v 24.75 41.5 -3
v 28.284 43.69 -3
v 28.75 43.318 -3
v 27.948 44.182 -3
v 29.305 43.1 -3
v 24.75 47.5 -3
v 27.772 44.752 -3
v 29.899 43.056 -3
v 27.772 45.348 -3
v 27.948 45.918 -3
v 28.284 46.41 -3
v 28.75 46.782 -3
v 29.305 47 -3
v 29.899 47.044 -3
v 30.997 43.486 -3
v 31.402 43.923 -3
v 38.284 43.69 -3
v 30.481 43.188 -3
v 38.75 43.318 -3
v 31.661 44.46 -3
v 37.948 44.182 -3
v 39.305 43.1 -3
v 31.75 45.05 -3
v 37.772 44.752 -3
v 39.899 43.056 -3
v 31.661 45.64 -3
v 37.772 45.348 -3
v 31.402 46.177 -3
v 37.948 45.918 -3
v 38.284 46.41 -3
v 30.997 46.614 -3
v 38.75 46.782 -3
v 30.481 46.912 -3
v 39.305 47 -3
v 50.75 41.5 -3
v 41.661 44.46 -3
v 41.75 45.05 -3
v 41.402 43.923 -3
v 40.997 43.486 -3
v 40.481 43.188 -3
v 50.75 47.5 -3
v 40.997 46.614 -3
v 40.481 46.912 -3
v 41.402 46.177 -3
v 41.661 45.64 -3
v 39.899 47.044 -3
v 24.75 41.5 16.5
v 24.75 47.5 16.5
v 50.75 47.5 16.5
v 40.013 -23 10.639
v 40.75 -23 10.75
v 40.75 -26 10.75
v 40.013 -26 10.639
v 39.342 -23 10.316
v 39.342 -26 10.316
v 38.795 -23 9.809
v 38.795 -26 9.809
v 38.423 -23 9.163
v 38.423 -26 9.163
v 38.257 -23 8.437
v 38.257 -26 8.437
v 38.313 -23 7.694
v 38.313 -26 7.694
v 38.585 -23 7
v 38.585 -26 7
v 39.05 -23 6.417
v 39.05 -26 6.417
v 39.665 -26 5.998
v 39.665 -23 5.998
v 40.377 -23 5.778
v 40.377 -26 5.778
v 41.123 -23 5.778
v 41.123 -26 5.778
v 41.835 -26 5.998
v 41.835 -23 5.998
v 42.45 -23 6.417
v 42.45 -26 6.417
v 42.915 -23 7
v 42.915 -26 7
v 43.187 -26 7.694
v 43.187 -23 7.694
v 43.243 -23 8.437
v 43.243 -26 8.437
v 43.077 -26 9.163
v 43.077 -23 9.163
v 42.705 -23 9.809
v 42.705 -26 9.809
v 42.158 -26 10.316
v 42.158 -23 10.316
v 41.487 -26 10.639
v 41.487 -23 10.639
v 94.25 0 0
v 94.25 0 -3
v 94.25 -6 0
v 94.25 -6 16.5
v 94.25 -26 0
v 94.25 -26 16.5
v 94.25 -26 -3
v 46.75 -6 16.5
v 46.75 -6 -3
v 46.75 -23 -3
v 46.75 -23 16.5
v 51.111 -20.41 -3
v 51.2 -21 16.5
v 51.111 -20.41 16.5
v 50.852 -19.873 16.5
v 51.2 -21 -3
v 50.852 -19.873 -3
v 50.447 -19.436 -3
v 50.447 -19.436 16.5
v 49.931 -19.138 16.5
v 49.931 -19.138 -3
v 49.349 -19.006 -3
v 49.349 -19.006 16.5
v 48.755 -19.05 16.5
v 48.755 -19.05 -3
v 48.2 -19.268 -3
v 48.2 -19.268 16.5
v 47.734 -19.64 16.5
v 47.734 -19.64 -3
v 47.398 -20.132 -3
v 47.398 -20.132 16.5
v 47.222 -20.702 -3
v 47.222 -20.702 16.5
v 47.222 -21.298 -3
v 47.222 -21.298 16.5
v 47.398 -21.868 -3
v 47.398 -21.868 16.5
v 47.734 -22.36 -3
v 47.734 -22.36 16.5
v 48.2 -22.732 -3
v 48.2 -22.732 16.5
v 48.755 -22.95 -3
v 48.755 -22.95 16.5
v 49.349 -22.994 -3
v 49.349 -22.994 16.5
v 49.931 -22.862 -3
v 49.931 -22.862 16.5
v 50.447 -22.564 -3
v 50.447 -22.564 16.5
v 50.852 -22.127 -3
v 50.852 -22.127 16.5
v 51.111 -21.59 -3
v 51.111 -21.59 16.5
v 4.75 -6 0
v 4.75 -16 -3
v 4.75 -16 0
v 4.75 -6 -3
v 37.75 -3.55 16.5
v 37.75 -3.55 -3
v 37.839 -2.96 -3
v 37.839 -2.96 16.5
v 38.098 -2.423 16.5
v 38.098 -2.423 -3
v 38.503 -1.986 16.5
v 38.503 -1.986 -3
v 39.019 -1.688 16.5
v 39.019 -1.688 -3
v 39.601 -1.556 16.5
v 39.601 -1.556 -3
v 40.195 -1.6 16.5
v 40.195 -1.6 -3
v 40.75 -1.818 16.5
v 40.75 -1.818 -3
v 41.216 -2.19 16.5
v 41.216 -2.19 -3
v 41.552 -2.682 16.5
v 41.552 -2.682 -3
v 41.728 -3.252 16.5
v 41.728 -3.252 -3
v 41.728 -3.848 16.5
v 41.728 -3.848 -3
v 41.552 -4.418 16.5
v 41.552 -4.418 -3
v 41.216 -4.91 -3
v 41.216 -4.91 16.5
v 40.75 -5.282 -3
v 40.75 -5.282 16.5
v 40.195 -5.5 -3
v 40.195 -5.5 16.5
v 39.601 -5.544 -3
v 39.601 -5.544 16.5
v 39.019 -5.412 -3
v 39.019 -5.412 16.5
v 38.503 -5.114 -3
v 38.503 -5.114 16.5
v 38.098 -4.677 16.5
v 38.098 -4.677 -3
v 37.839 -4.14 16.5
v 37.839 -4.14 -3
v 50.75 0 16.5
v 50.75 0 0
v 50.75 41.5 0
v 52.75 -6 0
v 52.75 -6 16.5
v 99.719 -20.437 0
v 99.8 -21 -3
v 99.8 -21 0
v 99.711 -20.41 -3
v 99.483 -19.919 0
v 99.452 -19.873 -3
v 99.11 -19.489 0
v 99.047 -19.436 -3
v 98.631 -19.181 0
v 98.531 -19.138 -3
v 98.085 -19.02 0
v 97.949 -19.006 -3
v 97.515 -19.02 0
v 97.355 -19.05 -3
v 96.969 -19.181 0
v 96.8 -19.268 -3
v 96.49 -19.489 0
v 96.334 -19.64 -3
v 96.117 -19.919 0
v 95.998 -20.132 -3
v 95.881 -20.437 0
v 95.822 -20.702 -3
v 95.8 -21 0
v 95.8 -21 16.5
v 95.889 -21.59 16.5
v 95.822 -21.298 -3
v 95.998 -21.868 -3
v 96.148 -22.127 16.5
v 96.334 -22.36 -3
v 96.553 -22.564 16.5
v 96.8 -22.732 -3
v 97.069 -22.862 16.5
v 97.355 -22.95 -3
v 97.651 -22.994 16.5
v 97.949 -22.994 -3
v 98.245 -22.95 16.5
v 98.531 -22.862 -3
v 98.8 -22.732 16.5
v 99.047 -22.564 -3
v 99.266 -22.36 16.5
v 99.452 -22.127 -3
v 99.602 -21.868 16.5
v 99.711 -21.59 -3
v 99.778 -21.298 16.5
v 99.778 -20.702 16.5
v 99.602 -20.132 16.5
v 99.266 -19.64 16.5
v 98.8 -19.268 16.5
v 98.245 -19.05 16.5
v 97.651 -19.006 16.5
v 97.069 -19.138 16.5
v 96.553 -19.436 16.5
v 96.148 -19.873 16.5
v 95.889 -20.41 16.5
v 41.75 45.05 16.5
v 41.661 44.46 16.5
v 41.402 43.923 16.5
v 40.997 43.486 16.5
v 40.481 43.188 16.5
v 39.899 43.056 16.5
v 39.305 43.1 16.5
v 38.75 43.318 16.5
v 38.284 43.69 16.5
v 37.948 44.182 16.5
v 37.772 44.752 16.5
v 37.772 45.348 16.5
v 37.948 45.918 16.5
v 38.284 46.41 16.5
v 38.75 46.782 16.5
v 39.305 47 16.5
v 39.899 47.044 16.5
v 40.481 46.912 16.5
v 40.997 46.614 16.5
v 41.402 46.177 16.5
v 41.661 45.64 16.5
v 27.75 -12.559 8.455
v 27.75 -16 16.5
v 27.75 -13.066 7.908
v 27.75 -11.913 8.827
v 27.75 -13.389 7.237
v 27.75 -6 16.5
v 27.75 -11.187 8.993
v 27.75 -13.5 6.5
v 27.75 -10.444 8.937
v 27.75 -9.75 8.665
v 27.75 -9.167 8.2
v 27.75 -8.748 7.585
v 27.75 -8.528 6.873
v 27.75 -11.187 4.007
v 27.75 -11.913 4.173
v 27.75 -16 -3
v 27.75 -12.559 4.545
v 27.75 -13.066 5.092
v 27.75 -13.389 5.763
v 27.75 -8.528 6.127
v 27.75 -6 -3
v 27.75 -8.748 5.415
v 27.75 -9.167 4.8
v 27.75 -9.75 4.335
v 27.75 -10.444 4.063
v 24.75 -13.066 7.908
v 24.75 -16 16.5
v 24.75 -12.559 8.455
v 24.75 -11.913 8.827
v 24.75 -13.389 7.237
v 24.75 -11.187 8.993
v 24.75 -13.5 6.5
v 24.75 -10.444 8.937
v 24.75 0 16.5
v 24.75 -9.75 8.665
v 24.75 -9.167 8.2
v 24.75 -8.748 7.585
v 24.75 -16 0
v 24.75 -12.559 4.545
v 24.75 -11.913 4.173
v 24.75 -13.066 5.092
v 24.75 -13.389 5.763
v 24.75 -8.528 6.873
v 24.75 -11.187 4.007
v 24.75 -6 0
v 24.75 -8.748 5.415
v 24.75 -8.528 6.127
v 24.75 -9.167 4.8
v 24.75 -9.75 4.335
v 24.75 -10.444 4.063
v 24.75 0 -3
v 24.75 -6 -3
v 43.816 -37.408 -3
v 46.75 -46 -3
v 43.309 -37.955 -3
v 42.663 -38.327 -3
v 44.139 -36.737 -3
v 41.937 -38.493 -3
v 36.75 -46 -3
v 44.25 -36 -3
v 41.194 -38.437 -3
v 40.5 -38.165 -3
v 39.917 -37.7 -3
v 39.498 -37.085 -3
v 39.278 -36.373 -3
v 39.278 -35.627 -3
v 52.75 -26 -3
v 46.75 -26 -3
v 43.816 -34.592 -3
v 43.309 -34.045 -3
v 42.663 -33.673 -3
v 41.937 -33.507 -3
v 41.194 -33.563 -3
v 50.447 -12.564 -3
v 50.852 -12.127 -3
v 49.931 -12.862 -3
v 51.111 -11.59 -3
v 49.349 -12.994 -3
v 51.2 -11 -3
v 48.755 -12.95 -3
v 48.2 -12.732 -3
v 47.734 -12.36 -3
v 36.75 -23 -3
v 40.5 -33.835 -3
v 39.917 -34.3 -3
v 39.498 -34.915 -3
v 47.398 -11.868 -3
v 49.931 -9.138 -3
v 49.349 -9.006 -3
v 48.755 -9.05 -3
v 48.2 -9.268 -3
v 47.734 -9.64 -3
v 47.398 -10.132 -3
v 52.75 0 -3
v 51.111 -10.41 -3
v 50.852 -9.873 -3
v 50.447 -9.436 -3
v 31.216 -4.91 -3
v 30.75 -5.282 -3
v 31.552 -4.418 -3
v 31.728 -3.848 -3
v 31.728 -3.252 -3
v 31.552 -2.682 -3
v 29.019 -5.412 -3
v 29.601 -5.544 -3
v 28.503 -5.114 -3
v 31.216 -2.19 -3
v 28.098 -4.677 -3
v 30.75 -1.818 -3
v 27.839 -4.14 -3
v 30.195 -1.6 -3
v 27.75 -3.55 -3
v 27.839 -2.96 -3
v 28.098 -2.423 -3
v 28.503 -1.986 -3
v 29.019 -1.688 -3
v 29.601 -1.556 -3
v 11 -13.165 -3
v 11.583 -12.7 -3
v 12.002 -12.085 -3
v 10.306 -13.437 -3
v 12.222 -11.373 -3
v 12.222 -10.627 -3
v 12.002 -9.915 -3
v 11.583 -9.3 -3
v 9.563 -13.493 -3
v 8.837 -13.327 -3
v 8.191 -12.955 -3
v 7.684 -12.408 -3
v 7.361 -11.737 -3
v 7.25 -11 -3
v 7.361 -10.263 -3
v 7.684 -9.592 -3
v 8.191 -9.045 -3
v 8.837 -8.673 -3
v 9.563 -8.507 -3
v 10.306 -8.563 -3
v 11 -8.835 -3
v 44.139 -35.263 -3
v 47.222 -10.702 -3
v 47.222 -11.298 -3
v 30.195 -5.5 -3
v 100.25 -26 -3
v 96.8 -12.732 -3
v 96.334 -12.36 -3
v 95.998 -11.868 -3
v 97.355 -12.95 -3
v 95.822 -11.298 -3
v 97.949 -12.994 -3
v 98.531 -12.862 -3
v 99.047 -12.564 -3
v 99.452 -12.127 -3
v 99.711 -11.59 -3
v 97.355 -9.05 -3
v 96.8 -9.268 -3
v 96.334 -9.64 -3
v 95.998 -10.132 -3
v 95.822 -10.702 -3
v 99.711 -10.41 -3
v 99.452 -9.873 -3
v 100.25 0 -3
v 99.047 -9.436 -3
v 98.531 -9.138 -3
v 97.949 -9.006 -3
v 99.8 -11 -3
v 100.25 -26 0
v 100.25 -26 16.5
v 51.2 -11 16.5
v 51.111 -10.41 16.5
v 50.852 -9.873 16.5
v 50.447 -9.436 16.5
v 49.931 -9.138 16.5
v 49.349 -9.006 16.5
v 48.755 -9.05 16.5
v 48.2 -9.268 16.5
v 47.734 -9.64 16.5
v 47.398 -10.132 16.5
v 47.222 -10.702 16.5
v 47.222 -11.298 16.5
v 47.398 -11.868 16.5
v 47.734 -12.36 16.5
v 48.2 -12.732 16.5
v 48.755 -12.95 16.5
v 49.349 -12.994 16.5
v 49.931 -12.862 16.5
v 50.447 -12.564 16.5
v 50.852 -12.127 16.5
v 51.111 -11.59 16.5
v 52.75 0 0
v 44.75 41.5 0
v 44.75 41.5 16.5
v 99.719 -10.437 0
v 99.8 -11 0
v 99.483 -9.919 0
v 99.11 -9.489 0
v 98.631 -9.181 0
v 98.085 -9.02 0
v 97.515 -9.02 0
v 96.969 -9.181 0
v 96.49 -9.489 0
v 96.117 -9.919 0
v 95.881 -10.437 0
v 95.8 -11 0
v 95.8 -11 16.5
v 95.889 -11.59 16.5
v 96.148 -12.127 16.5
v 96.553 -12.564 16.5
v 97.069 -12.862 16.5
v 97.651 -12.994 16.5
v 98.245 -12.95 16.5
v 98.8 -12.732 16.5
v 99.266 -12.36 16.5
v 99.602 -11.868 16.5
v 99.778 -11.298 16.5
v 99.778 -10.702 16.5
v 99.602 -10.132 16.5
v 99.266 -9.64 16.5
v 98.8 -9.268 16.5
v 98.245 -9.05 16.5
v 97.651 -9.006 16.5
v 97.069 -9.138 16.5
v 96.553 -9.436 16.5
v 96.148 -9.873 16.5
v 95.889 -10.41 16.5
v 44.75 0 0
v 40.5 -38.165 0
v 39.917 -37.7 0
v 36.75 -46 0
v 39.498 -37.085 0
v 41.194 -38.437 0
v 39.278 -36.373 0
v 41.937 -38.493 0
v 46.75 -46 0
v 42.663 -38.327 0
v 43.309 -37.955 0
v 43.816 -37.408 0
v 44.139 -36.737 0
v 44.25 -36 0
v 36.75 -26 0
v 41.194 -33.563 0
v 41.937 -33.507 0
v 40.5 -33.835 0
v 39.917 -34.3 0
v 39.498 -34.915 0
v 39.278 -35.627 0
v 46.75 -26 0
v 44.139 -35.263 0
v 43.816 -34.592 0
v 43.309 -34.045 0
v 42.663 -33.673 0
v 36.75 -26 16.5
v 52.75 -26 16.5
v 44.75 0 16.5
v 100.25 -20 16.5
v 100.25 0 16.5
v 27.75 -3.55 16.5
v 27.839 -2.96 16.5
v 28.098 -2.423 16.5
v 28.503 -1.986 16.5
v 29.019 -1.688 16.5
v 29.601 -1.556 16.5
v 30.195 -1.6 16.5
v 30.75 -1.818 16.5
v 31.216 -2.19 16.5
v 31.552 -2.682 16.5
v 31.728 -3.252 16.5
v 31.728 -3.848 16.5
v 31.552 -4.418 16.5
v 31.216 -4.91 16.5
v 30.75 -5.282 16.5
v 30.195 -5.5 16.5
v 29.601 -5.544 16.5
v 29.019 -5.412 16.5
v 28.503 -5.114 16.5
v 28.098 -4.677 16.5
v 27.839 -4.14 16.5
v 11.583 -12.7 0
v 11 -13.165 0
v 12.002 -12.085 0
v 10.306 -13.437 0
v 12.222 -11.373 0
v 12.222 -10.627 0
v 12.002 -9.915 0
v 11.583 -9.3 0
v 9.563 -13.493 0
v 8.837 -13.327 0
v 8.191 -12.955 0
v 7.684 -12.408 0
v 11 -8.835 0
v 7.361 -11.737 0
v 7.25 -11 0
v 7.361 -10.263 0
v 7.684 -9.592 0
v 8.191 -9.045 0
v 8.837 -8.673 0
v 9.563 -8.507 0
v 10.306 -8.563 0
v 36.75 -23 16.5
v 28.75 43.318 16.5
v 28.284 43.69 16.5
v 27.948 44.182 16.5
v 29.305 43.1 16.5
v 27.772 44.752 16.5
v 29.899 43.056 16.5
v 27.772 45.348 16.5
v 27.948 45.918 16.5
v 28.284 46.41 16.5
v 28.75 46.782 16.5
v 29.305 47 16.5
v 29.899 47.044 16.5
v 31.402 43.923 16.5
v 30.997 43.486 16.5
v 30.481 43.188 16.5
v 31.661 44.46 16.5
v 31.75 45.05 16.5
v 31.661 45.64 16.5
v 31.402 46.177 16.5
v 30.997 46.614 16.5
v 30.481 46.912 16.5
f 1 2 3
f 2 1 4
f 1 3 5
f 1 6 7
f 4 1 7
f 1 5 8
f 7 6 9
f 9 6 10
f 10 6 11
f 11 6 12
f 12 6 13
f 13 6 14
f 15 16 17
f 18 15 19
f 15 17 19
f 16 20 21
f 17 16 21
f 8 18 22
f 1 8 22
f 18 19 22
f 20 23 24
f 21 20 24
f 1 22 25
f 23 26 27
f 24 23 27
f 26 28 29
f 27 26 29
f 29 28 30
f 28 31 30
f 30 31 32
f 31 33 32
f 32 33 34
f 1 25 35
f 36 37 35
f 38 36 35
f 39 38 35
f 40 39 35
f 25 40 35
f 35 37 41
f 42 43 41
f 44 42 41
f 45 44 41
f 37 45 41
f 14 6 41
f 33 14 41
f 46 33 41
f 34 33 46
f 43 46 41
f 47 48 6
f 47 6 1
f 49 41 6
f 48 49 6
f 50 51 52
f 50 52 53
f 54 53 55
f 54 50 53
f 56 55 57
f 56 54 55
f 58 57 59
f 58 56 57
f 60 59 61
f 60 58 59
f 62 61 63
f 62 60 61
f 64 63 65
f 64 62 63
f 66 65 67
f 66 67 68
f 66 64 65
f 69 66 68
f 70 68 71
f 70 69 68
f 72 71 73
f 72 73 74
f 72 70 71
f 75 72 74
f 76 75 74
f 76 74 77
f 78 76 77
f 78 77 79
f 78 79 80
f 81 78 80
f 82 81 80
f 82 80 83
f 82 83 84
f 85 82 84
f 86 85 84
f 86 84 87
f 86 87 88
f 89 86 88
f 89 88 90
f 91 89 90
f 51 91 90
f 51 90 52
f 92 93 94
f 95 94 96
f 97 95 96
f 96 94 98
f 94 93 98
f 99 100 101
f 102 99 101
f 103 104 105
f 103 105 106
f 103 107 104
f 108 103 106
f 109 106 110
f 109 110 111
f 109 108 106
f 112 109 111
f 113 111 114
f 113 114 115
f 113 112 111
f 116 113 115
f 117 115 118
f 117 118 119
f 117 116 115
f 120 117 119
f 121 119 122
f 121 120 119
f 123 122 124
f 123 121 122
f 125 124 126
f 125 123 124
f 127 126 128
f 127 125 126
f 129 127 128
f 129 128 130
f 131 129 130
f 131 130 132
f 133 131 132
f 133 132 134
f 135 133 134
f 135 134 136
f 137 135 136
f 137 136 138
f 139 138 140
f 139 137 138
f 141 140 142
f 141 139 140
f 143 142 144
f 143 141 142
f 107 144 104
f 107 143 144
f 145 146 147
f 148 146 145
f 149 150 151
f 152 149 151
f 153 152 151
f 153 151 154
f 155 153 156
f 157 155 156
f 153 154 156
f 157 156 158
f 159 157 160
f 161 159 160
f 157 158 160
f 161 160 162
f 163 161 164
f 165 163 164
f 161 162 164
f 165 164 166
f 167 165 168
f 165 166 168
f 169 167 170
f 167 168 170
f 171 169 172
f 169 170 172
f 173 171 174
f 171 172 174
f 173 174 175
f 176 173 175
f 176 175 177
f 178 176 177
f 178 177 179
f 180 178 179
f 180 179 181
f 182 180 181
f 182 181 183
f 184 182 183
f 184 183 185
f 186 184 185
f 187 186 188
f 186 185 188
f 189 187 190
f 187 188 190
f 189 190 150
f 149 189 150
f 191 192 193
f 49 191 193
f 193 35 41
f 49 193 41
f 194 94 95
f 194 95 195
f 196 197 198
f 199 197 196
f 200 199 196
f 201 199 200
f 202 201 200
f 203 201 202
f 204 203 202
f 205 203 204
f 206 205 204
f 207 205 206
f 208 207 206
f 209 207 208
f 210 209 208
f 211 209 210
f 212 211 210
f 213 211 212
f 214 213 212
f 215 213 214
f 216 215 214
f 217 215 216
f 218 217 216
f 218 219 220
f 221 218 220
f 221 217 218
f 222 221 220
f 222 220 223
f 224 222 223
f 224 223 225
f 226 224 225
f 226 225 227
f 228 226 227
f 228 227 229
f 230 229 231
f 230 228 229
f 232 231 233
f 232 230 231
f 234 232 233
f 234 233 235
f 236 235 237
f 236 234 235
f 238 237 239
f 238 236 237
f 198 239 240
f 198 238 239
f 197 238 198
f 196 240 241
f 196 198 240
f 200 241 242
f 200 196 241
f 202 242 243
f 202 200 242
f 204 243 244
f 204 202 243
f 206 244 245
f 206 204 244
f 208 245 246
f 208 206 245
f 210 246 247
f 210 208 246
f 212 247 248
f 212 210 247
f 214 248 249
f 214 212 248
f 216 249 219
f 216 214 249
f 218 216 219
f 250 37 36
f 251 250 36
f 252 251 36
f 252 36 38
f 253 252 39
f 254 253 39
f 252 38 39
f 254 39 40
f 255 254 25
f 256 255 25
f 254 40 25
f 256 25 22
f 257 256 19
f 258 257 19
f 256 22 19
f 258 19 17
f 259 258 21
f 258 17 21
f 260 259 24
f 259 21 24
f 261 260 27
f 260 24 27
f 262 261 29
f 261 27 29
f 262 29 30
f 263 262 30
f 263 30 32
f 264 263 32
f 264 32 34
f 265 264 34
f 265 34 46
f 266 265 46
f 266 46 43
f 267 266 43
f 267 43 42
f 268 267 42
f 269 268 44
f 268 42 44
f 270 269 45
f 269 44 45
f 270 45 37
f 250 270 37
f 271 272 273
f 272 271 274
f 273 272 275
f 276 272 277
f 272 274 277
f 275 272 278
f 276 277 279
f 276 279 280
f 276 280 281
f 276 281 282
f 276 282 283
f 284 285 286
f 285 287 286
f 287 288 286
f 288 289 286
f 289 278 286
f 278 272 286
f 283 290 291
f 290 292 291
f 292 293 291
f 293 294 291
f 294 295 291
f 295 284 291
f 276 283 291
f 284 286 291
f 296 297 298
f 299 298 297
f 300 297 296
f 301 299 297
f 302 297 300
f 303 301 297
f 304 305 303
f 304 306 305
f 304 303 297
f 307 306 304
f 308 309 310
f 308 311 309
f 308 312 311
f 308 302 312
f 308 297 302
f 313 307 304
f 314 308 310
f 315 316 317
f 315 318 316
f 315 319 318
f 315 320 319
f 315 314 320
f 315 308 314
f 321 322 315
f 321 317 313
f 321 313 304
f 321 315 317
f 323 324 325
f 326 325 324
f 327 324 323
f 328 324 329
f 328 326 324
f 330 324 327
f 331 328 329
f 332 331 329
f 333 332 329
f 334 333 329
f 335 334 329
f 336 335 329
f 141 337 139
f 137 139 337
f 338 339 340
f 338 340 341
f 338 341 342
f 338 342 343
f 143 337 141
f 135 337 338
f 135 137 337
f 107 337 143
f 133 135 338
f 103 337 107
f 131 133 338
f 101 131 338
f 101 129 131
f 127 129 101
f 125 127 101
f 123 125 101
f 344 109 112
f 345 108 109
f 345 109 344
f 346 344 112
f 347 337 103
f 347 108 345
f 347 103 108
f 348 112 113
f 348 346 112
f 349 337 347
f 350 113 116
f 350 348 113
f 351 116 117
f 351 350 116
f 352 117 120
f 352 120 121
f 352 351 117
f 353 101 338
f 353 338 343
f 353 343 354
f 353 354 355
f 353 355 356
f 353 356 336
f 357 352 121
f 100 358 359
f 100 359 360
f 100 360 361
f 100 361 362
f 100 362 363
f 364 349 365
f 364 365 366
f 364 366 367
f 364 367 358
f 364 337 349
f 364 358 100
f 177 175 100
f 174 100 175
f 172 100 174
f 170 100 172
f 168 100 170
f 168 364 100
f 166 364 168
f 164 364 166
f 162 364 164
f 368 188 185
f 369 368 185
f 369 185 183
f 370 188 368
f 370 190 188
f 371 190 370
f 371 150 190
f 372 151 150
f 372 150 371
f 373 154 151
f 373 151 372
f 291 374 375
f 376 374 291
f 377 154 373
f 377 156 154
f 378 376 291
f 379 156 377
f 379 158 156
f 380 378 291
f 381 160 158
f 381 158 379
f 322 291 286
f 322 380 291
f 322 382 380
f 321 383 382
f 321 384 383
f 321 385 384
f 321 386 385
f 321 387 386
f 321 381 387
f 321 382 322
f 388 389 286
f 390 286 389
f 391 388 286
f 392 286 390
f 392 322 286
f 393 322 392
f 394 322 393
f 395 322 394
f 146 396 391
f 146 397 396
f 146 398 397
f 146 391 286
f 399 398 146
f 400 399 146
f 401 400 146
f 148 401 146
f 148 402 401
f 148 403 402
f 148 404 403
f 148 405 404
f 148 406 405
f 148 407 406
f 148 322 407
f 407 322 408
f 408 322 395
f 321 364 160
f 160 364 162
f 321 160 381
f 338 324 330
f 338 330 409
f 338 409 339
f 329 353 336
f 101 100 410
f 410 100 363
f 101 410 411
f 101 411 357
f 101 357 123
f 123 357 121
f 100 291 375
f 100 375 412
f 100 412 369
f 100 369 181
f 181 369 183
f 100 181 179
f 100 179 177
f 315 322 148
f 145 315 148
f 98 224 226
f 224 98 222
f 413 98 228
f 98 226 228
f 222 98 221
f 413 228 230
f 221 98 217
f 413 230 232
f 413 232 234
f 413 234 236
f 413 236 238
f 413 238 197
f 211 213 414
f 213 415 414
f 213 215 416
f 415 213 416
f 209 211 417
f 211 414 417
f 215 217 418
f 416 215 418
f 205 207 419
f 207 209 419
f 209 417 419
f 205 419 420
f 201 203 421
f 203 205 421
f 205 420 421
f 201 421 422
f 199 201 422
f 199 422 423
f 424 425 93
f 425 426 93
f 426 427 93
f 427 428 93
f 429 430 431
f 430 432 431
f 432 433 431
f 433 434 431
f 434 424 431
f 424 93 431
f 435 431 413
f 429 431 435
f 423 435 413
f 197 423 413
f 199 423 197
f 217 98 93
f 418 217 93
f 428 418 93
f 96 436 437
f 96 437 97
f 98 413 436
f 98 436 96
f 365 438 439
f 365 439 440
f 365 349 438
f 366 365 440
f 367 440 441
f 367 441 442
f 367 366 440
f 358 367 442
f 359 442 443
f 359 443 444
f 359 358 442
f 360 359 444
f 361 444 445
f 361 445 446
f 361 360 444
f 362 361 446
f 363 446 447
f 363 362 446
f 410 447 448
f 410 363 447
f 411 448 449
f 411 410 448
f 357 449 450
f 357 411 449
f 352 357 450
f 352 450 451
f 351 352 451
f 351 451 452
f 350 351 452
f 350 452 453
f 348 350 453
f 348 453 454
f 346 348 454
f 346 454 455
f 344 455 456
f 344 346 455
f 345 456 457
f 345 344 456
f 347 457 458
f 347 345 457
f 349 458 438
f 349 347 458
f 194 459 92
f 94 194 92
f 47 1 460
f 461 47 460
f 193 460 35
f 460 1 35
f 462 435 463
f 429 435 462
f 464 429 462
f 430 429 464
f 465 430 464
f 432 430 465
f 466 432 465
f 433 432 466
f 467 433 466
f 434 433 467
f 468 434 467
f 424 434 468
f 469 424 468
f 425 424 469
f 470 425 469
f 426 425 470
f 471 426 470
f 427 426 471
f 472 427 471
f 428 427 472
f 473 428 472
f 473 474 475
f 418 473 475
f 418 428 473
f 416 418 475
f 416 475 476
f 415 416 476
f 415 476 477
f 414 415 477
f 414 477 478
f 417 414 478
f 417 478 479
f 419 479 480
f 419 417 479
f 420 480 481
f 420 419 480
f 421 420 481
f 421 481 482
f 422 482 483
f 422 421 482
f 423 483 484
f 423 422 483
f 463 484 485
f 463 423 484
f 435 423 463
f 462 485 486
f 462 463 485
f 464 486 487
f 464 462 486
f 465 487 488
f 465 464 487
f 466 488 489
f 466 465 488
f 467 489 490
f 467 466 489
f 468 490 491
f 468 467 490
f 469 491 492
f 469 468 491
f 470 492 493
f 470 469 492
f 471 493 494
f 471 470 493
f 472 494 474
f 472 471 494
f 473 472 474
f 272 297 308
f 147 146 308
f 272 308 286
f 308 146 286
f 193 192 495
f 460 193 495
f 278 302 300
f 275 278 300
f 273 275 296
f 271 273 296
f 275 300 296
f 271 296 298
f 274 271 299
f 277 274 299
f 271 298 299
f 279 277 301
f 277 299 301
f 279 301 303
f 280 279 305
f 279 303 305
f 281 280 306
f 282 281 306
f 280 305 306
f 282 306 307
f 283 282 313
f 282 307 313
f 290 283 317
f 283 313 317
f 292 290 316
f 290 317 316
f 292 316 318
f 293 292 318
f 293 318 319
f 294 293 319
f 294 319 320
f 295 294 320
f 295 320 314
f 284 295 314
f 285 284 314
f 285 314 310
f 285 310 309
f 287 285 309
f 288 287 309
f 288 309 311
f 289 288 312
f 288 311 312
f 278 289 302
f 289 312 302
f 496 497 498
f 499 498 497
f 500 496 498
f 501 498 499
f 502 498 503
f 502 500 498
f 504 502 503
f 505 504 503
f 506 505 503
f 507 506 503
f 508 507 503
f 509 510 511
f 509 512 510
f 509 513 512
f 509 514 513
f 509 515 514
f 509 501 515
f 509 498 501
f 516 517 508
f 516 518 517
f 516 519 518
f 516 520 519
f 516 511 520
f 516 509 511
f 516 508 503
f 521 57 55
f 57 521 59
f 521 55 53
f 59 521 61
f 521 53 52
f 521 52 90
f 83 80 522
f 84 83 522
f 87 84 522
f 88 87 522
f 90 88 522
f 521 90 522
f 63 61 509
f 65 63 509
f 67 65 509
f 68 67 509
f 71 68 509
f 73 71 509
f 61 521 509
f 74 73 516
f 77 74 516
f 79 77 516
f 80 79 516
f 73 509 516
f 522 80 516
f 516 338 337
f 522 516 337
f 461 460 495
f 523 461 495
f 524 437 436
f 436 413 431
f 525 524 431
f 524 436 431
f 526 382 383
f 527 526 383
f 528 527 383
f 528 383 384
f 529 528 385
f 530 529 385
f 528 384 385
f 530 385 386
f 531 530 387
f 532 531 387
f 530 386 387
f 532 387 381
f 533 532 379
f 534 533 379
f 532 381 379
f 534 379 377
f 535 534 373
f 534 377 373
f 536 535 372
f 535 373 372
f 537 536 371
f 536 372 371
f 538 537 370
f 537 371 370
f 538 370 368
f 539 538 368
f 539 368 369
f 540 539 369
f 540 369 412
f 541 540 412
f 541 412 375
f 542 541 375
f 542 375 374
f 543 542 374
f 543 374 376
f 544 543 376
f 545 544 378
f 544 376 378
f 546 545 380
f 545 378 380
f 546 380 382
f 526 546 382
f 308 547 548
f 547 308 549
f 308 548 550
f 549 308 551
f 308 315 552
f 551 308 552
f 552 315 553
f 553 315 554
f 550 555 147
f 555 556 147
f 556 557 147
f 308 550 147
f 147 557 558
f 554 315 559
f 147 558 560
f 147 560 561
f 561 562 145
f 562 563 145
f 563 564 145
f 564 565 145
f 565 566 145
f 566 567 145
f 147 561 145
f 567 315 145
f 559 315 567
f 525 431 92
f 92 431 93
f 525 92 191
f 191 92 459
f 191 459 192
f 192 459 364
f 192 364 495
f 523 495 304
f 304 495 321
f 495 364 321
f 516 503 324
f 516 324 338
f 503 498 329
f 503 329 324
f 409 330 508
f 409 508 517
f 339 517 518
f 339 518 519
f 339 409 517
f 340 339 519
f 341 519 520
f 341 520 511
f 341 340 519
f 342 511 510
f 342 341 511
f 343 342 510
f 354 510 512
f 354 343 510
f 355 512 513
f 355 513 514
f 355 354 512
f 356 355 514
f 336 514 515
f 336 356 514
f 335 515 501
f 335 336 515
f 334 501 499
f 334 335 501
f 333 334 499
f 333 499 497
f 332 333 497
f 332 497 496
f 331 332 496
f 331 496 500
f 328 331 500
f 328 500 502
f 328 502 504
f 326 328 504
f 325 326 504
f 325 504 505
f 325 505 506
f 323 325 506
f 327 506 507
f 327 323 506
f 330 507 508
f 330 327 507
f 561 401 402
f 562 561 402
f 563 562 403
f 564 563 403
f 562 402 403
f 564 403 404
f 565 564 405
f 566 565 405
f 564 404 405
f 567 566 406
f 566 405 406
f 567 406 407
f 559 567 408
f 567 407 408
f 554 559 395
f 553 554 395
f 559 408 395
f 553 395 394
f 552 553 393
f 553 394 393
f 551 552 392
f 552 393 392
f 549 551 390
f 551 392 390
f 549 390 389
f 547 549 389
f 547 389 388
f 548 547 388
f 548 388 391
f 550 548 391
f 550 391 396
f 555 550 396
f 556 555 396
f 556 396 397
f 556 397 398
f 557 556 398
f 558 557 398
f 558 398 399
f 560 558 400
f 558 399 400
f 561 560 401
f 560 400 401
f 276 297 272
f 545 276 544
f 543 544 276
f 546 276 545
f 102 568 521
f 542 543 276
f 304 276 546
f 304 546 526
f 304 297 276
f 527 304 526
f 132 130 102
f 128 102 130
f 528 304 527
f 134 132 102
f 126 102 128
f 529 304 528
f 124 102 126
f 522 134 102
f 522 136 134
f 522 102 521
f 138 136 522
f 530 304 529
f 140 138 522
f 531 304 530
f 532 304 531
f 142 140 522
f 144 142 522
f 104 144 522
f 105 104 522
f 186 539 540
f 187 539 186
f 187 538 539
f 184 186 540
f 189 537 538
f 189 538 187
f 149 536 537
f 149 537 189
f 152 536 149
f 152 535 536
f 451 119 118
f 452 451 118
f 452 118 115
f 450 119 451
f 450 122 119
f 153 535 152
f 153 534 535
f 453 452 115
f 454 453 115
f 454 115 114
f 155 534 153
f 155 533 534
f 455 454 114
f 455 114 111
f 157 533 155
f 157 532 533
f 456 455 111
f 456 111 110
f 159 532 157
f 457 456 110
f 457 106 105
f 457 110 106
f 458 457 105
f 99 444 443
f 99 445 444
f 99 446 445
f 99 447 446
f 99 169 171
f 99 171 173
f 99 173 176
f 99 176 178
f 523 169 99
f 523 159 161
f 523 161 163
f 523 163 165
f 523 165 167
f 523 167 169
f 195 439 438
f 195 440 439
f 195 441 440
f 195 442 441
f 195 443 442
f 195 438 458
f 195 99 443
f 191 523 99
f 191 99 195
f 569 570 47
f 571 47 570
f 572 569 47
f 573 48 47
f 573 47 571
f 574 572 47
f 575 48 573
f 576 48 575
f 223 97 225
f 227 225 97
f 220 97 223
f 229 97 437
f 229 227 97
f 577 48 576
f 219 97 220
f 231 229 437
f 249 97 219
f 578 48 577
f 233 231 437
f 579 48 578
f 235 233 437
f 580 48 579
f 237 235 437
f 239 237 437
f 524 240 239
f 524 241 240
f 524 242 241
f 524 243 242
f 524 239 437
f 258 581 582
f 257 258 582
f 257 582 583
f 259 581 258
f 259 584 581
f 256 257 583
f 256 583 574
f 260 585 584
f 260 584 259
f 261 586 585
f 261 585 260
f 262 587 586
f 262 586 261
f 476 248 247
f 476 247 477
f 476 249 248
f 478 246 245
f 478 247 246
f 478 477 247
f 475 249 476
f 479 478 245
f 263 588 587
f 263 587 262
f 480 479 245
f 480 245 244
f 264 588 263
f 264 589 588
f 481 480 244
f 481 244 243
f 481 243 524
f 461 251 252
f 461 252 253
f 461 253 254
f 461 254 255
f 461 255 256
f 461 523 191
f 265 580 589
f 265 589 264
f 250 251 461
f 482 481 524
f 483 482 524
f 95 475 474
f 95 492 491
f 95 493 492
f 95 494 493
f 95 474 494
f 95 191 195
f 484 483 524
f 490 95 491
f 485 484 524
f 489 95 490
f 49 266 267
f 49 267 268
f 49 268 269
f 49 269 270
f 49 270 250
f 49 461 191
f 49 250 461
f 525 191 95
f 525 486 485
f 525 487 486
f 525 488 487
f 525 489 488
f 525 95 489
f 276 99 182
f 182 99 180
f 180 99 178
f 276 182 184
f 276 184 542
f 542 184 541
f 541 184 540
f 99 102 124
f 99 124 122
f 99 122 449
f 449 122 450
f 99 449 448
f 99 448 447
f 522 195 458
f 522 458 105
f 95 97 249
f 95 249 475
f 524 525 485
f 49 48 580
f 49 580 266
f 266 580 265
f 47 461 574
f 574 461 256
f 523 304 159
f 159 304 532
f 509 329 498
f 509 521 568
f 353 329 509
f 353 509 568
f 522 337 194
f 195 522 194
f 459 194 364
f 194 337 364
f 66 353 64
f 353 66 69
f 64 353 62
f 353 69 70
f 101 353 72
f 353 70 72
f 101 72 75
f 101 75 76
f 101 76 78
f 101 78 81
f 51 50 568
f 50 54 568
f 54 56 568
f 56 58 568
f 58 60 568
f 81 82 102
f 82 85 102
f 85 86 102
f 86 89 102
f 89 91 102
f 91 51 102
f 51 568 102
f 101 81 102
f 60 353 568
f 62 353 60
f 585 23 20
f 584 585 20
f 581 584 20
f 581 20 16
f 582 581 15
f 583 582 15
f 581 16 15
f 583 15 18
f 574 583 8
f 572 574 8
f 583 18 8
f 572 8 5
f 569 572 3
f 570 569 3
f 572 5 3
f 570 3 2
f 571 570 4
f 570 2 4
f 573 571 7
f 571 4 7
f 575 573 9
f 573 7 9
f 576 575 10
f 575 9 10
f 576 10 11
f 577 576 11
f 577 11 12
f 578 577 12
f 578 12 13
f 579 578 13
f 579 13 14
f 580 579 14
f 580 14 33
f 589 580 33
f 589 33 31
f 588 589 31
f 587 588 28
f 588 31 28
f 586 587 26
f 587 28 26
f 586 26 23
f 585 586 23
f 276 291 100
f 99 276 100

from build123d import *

# Parameters (mm, degrees)
EXTRUDE_1_DEPTH      = 16.5
SKETCH_2_R           = 2.5
CUT_EXTRUDE_1_DEPTH  = 16.5
SKETCH_3_W           = 10
SKETCH_3_H           = 16.5
CUT_EXTRUDE_2_DEPTH  = 3
SKETCH_4_W           = 11.896315449
SKETCH_4_H           = 29.084641161
CUT_EXTRUDE_3_DEPTH  = 48.945933091
SKETCH_5_R           = 2
CUT_EXTRUDE_4_DEPTH  = 48.945933091
SKETCH_6_W           = 10
SKETCH_6_H           = 23
EXTRUDE_2_DEPTH      = 3
SKETCH_7_R           = 2.5
CUT_EXTRUDE_5_DEPTH  = 3
EXTRUDE_START        = 3
SKETCH_8_R           = 2
SKETCH_8_W           = 6
SKETCH_8_H           = 26
EXTRUDE_3_DEPTH      = 3
SKETCH_9_R           = 2.5
CUT_EXTRUDE_6_DEPTH  = 3
SKETCH_10_W          = 74.694005649
SKETCH_10_H          = 52.095093629
CUT_EXTRUDE_7_DEPTH  = 116.604119736
SKETCH_11_W          = 16.482634167
SKETCH_11_H          = 25.810545036
CUT_EXTRUDE_8_DEPTH  = 10
SKETCH_13_R          = 2
EXTRUDE_4_DEPTH      = 19.5
SKETCH_14_W          = 6
SKETCH_14_H          = 41.5
CUT_EXTRUDE_9_DEPTH  = 3
SKETCH_15_W          = 23
SKETCH_15_H          = 10
SKETCH_15_R          = 2.5
EXTRUDE_5_DEPTH      = 3
SKETCH_16_W          = 3
SKETCH_16_H          = 10
EXTRUDE_6_DEPTH      = 16.5
SKETCH_17_R          = 2.5
CUT_EXTRUDE_10_DEPTH = 3


with BuildPart() as part:
    # 草图1 → 凸台-拉伸1 (new body)
    with BuildSketch(Plane.XY):
        Polygon((0, 0), (26.75, 0), (26.75, -20), (36.75, -20), (36.75, -26), (20.75, -26), (20.75, -6), (0, -6), (-20.75, -6), (-20.75, -26), (-36.75, -26), (-36.75, -20), (-26.75, -20), (-26.75, 0), align=None)
    extrude(amount=EXTRUDE_1_DEPTH)

    # 草图2 → 切除-拉伸1 (cut)
    with BuildSketch(Plane(origin=(0, -20, 0), x_dir=(1, 0, 0), z_dir=(0, 1, 0))):
        with Locations(Location((32.75, -8.25, 0), (0, 0, 270))):
            Circle(SKETCH_2_R)
    extrude(amount=-CUT_EXTRUDE_1_DEPTH, mode=Mode.SUBTRACT)

    # 草图3 → 切除-拉伸2 (cut)
    with BuildSketch(Plane(origin=(0, -20, 0), x_dir=(1, 0, 0), z_dir=(0, 1, 0))):
        with Locations((31.75, -8.25)):
            Rectangle(SKETCH_3_W, SKETCH_3_H)
    extrude(amount=-CUT_EXTRUDE_2_DEPTH, mode=Mode.SUBTRACT)

    # 草图4 → 切除-拉伸3 (cut, through all)
    with BuildSketch(Plane.XY.offset(16.5)):
        with Locations((-32.698157724, -14.542320581)):
            Rectangle(SKETCH_4_W, SKETCH_4_H)
    extrude(amount=-CUT_EXTRUDE_3_DEPTH, mode=Mode.SUBTRACT)

    # 草图5 → 切除-拉伸4 (cut, through all)
    with BuildSketch(Plane(origin=(0, 0, 0), x_dir=(-1, 0, 0), z_dir=(0, 0, -1))):
        with Locations((-24.3, -11)):
            Circle(SKETCH_5_R)
        with Locations((-24.3, -21)):
            Circle(SKETCH_5_R)
        with Locations(Location((24.3, -21, 0), (0, 0, 180))):
            Circle(SKETCH_5_R)
        with Locations(Location((24.3, -11, 0), (0, 0, 180))):
            Circle(SKETCH_5_R)
    extrude(amount=-CUT_EXTRUDE_4_DEPTH, mode=Mode.SUBTRACT)

    # 草图6 → 凸台-拉伸2 (add)
    with BuildSketch(Plane(origin=(0, 0, 0), x_dir=(-1, 0, 0), z_dir=(0, 0, -1))):
        with Locations((-31.75, -34.5)):
            Rectangle(SKETCH_6_W, SKETCH_6_H)
    extrude(amount=EXTRUDE_2_DEPTH)

    # 草图7 → 切除-拉伸5 (cut)
    with BuildSketch(Plane(origin=(0, 0, -3), x_dir=(-1, 0, 0), z_dir=(0, 0, -1))):
        with Locations((-31.75, -36)):
            Circle(SKETCH_7_R)
    extrude(amount=-CUT_EXTRUDE_5_DEPTH, mode=Mode.SUBTRACT)

    # 草图8 → 凸台-拉伸3 (add)
    # profile 1 of 2: a face of its own
    with BuildSketch(Plane(origin=(0, 0, 0), x_dir=(-1, 0, 0), z_dir=(0, 0, -1)).offset(EXTRUDE_START)):
        Polygon((26.75, 0), (20.75, 0), (20.75, -46), (26.75, -46), (30.75, -46), (30.75, -26), (26.75, -26), align=None)
        with Locations((24.3, -21)):
            Circle(SKETCH_8_R, mode=Mode.SUBTRACT)
        with Locations((24.3, -11)):
            Circle(SKETCH_8_R, mode=Mode.SUBTRACT)
    # profile 2 of 2: a face of its own
    with BuildSketch(Plane(origin=(0, 0, 0), x_dir=(-1, 0, 0), z_dir=(0, 0, -1)).offset(EXTRUDE_START)):
        with Locations((-23.75, -13)):
            Rectangle(SKETCH_8_W, SKETCH_8_H)
        with Locations((-24.3, -11)):
            Circle(SKETCH_8_R, mode=Mode.SUBTRACT)
        with Locations((-24.3, -21)):
            Circle(SKETCH_8_R, mode=Mode.SUBTRACT)
    extrude(amount=-EXTRUDE_3_DEPTH)

    # 草图9 → 切除-拉伸6 (cut)
    with BuildSketch(Plane(origin=(0, 0, -3), x_dir=(-1, 0, 0), z_dir=(0, 0, -1))):
        with Locations((25.75, -36)):
            Circle(SKETCH_9_R)
    extrude(amount=-CUT_EXTRUDE_6_DEPTH, mode=Mode.SUBTRACT)

    # 镜向1: part across plane


with BuildPart() as part_1:
    add(part.part)
    add(part.part.mirror(Plane(origin=(36.75, -20, 16.5), x_dir=(0, 0, 1), z_dir=(-1, 0, 0))))

    # 草图10 → 切除-拉伸7 (cut, through all)
    with BuildSketch(Plane(origin=(0, 0, -3), x_dir=(-1, 0, 0), z_dir=(0, 0, -1))):
        with Locations((0.597002825, -19.952453186)):
            Rectangle(SKETCH_10_W, SKETCH_10_H)
    extrude(amount=-CUT_EXTRUDE_7_DEPTH, mode=Mode.SUBTRACT)

    # 草图11 → 切除-拉伸8 (cut)
    with BuildSketch(Plane(origin=(0, 0, -3), x_dir=(-1, 0, 0), z_dir=(0, 0, -1))):
        with Locations((-102.491317084, -38.905272518)):
            Rectangle(SKETCH_11_W, SKETCH_11_H)
    extrude(amount=-CUT_EXTRUDE_8_DEPTH, mode=Mode.SUBTRACT)

    # 草图13 → 凸台-拉伸4 (add)
    with BuildSketch(Plane(origin=(0, 0, -3), x_dir=(-1, 0, 0), z_dir=(0, 0, -1))):
        Polygon((-24.75, -6), (-50.75, -6), (-50.75, 47.5), (-24.75, 47.5), (-24.75, 41.5), (-44.75, 41.5), (-44.75, 0), (-24.75, 0), align=None)
        with Locations((-29.75, -3.55)):
            Circle(SKETCH_13_R, mode=Mode.SUBTRACT)
        with Locations((-39.75, -3.55)):
            Circle(SKETCH_13_R, mode=Mode.SUBTRACT)
        with Locations(Location((-39.75, 45.05, 0), (0, 0, 180))):
            Circle(SKETCH_13_R, mode=Mode.SUBTRACT)
        with Locations(Location((-29.75, 45.05, 0), (0, 0, 180))):
            Circle(SKETCH_13_R, mode=Mode.SUBTRACT)
    extrude(amount=-EXTRUDE_4_DEPTH)

    # 草图14 → 切除-拉伸9 (cut)
    with BuildSketch(Plane(origin=(0, 0, -3), x_dir=(-1, 0, 0), z_dir=(0, 0, -1))):
        with Locations((-47.75, 20.75)):
            Rectangle(SKETCH_14_W, SKETCH_14_H)
    extrude(amount=-CUT_EXTRUDE_9_DEPTH, mode=Mode.SUBTRACT)

    # 草图15 → 凸台-拉伸5 (add)
    with BuildSketch(Plane(origin=(0, 0, -3), x_dir=(-1, 0, 0), z_dir=(0, 0, -1))):
        with Locations((-16.25, -11)):
            Rectangle(SKETCH_15_W, SKETCH_15_H)
        with Locations((-9.75, -11)):
            Circle(SKETCH_15_R, mode=Mode.SUBTRACT)
    extrude(amount=-EXTRUDE_5_DEPTH)

    # 草图16 → 凸台-拉伸6 (add)
    with BuildSketch(Plane.XY):
        with Locations((26.25, -11)):
            Rectangle(SKETCH_16_W, SKETCH_16_H)
    extrude(amount=EXTRUDE_6_DEPTH)

    # 草图17 → 切除-拉伸10 (cut)
    with BuildSketch(Plane.ZY.offset(-24.75)):
        with Locations(Location((6.5, -11, 0), (0, 0, 270))):
            Circle(SKETCH_17_R)
    extrude(amount=-CUT_EXTRUDE_10_DEPTH, mode=Mode.SUBTRACT)


solid = part_1.part
